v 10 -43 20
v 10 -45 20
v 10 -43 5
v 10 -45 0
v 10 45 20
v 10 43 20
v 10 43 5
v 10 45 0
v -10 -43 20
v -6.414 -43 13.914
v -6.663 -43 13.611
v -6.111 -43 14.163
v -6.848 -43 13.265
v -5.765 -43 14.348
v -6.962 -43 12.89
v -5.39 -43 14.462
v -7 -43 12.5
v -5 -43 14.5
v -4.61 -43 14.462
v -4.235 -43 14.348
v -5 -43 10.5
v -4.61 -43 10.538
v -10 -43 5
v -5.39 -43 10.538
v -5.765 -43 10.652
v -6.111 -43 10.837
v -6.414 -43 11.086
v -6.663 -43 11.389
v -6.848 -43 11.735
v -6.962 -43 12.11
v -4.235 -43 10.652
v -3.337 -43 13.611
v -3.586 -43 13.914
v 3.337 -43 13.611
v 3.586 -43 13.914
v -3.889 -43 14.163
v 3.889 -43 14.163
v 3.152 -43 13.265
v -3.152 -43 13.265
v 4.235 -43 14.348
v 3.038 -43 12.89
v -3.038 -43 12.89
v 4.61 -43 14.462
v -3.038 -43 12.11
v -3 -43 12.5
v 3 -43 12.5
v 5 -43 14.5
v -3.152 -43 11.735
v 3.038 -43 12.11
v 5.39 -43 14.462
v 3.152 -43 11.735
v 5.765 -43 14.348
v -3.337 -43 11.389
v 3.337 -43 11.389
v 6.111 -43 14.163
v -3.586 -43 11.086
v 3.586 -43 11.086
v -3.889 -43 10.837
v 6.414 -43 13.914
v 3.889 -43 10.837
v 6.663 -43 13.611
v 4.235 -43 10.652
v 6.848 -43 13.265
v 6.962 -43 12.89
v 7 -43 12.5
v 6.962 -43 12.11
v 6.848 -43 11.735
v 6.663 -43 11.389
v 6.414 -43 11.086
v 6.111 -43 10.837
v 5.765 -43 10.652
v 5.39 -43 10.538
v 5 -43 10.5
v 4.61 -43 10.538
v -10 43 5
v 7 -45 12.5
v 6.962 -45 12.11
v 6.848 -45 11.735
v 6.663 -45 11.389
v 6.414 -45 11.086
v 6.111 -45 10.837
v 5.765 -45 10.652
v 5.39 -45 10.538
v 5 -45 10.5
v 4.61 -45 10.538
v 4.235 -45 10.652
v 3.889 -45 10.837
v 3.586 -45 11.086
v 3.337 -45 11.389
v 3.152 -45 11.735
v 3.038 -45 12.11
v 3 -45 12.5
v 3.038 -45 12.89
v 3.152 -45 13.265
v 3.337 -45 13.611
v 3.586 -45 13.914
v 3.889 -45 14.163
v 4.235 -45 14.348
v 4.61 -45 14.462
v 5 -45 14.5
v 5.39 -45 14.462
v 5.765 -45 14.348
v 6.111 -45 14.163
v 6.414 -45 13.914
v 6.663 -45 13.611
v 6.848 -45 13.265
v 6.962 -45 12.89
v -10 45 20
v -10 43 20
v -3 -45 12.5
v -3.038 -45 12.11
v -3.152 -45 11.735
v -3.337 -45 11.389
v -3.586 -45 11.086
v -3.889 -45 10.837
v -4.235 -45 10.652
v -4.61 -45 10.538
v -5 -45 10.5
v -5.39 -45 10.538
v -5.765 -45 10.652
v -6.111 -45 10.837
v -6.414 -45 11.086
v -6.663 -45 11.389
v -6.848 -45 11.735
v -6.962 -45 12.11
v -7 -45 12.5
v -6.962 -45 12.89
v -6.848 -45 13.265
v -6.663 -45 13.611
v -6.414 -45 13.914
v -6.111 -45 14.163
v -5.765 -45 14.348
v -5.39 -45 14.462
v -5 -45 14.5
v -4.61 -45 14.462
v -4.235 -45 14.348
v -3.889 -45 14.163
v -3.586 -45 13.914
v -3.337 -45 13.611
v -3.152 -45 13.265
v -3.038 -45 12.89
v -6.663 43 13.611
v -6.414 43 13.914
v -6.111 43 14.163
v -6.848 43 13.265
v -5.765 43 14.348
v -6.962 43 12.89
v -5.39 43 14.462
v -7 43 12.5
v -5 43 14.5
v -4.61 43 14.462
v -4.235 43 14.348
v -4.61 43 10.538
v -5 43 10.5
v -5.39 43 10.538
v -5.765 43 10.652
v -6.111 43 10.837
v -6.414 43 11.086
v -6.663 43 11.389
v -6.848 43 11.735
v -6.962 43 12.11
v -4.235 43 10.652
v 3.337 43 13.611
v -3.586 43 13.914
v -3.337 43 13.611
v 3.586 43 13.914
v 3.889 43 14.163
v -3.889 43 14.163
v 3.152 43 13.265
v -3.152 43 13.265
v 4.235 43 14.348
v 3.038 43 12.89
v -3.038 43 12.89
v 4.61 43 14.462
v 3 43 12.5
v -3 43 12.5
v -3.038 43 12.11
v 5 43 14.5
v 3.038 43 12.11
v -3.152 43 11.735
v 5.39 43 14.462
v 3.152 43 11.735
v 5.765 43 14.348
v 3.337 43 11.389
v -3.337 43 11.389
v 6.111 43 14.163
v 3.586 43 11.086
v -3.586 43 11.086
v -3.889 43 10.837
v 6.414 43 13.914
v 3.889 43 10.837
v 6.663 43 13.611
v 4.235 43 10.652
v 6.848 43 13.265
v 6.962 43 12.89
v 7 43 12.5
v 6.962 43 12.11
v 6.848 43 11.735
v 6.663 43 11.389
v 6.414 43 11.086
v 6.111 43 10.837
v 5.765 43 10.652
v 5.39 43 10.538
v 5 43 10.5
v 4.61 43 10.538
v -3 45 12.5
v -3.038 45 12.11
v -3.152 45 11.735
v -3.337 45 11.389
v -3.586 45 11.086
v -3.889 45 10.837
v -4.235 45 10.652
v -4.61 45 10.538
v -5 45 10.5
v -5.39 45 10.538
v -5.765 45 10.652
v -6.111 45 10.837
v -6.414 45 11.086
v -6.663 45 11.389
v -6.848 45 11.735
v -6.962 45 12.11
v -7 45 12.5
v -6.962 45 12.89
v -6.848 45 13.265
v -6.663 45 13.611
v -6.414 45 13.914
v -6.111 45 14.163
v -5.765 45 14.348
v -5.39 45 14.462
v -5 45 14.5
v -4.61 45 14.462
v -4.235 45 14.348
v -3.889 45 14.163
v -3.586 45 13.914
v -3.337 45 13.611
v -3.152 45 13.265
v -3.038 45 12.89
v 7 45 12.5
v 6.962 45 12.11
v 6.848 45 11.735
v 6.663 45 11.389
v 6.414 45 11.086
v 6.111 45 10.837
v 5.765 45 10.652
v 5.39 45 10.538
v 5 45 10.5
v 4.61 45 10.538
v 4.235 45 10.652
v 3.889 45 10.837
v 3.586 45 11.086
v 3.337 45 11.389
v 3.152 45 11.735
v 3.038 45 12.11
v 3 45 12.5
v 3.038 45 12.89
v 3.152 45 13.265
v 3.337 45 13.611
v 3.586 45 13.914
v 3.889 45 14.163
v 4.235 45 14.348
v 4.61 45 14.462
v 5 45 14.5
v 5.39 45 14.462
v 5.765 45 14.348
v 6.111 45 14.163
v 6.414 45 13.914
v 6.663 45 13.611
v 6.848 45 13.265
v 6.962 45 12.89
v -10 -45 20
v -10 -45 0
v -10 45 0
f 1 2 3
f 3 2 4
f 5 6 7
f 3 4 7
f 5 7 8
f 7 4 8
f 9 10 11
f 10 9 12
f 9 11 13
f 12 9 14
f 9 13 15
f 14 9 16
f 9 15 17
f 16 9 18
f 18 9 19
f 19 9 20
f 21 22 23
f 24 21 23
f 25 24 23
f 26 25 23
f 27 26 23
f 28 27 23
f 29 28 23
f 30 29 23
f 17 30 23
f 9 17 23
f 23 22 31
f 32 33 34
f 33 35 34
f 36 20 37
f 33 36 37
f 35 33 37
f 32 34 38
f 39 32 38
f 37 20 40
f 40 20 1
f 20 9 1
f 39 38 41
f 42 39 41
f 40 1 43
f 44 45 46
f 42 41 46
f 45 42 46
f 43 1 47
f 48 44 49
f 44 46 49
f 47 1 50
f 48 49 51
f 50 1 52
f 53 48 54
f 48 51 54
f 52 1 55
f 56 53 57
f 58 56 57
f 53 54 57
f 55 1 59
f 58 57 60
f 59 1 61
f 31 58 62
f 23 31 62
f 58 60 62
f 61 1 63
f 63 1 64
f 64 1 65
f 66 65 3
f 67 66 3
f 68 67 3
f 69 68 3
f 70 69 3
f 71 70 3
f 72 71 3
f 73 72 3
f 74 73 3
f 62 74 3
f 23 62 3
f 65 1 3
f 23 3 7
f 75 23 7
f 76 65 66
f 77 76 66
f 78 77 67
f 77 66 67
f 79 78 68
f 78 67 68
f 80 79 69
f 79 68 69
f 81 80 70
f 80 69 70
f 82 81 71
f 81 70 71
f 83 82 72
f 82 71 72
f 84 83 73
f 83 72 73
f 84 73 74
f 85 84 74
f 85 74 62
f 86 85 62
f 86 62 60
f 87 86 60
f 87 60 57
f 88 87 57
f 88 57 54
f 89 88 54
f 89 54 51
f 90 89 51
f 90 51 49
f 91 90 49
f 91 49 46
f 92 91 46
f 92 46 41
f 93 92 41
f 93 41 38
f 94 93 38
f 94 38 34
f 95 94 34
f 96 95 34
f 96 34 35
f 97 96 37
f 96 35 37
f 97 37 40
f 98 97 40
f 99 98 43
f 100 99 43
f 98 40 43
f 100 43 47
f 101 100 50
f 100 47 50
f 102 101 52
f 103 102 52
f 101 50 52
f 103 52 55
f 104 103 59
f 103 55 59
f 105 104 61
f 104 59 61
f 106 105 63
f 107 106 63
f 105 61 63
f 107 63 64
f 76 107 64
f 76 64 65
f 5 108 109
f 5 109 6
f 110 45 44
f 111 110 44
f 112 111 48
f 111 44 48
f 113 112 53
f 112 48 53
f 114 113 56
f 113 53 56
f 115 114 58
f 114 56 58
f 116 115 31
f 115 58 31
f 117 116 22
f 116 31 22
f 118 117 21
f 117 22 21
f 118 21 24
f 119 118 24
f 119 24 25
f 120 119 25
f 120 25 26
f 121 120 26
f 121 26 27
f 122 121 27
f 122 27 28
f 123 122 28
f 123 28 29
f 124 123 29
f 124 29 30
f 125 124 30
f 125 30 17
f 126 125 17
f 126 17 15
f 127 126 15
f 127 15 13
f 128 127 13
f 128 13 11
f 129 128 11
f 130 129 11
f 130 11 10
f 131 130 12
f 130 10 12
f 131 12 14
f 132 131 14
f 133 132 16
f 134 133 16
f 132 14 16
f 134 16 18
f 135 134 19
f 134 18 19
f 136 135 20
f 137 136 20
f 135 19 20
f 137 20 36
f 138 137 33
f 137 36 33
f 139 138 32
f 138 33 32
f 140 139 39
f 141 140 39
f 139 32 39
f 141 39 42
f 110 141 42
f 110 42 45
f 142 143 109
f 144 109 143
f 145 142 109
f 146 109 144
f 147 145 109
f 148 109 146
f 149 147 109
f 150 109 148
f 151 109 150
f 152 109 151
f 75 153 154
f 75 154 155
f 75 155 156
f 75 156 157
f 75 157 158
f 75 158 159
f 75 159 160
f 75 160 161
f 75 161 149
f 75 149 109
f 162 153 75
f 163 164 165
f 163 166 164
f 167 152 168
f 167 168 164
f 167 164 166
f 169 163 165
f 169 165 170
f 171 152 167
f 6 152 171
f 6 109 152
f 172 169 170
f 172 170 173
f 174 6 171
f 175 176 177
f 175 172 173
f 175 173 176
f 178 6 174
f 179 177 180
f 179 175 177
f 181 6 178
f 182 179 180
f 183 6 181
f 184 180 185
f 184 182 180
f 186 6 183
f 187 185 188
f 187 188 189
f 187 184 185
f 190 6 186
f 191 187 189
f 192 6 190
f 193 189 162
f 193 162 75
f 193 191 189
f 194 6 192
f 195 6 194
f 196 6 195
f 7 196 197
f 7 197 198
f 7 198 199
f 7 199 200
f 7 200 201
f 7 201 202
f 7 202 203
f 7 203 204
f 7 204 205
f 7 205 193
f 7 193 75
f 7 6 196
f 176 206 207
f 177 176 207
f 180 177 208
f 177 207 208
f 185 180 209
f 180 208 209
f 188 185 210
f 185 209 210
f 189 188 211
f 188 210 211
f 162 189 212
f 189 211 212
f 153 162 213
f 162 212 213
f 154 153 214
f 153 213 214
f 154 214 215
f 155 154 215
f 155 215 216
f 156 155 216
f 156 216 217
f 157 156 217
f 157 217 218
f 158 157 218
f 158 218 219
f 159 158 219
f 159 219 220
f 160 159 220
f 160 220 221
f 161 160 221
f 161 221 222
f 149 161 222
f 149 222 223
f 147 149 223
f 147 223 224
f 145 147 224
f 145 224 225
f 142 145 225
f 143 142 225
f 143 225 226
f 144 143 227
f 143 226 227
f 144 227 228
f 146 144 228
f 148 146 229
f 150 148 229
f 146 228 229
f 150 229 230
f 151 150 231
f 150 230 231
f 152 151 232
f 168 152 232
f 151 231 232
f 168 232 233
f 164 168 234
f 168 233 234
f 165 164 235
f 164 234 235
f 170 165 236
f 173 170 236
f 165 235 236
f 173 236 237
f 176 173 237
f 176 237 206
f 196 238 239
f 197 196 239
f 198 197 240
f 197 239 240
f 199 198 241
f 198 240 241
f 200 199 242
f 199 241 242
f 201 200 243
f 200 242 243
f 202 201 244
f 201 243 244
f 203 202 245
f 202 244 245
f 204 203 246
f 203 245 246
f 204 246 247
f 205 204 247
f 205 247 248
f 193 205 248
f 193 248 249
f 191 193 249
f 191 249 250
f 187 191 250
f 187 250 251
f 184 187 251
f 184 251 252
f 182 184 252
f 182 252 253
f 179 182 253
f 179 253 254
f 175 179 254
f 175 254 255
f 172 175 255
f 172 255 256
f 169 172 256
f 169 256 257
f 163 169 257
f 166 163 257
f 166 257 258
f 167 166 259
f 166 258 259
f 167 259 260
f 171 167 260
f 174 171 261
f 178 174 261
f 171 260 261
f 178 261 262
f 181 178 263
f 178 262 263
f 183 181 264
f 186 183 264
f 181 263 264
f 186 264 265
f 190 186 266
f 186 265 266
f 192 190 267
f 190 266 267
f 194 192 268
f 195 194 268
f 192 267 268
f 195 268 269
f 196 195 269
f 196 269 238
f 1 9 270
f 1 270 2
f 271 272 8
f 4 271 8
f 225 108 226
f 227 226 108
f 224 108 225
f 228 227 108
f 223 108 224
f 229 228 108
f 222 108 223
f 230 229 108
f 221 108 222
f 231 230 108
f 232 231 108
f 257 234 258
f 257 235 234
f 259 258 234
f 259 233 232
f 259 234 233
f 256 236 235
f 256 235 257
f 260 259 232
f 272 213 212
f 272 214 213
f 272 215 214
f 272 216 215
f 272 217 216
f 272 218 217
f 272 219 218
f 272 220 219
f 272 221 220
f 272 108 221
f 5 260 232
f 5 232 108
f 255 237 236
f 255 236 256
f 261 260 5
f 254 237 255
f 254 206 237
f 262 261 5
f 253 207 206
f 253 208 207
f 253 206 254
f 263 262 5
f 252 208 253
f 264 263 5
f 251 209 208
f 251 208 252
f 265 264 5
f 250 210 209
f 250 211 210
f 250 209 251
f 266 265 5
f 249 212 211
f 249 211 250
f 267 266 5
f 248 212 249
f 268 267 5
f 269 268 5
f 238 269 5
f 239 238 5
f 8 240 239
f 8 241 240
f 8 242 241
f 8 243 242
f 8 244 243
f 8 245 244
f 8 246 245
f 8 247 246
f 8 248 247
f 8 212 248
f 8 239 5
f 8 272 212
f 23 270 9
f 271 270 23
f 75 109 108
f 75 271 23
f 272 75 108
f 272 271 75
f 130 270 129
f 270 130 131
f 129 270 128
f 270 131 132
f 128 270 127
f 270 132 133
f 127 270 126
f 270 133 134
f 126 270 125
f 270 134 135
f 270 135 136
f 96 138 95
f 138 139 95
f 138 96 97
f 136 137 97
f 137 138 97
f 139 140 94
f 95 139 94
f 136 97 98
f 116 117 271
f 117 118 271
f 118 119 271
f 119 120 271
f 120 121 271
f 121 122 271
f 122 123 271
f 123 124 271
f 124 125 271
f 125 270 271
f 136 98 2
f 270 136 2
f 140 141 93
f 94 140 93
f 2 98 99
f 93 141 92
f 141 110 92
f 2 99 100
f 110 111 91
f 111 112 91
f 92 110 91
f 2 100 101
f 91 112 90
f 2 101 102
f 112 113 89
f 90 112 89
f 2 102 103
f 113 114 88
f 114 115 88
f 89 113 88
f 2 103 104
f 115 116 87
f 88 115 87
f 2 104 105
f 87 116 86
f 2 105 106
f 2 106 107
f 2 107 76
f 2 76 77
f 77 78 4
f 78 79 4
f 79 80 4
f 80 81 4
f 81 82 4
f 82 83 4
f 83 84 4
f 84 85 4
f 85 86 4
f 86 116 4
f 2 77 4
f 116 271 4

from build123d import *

# Parameters (mm, degrees)
SKETCH1_W               = 20
SKETCH1_H               = 90
BOSS_EXTRUDE1_DEPTH     = 20
CUT_EXTRUDE1_REACH      = 22
SKETCH2_W               = 15
SKETCH2_H               = 86
SKETCH3_R               = 2
CUT_EXTRUDE2_DEPTH      = 1
CUT_EXTRUDE2_DEPTH_BACK = 140


with BuildPart() as part:
    # Sketch1 → Boss-Extrude1 (new body)
    with BuildSketch(Plane.XY):
        Rectangle(SKETCH1_W, SKETCH1_H)
    extrude(amount=BOSS_EXTRUDE1_DEPTH)

    # Sketch2 → Cut-Extrude1 (cut, up to next)
    with BuildSketch(Plane(origin=(10, 0, 0), x_dir=(0, 0, -1), z_dir=(1, 0, 0)), mode=Mode.PRIVATE) as cut_extrude1_sk1:
        with Locations((-12.5, 0)):
            Rectangle(SKETCH2_W, SKETCH2_H)
    cut_extrude1_tool1 = extrude(cut_extrude1_sk1.sketch, amount=-CUT_EXTRUDE1_REACH, mode=Mode.PRIVATE) & part.part
    add(cut_extrude1_tool1.solids().sort_by_distance((10, 0, 12.5))[0], mode=Mode.SUBTRACT)

    # Sketch3 → Cut-Extrude2 (cut, two sides)
    with BuildSketch(Plane(origin=(0, 45, 0), x_dir=(1, 0, 0), z_dir=(0, 1, 0))) as cut_extrude2_sk:
        with Locations((-5, -12.5)):
            Circle(SKETCH3_R)
        with Locations((5, -12.5)):
            Circle(SKETCH3_R)
    extrude(amount=CUT_EXTRUDE2_DEPTH, mode=Mode.SUBTRACT)
    extrude(cut_extrude2_sk.sketch, amount=-CUT_EXTRUDE2_DEPTH_BACK, mode=Mode.SUBTRACT)


solid = part.part
